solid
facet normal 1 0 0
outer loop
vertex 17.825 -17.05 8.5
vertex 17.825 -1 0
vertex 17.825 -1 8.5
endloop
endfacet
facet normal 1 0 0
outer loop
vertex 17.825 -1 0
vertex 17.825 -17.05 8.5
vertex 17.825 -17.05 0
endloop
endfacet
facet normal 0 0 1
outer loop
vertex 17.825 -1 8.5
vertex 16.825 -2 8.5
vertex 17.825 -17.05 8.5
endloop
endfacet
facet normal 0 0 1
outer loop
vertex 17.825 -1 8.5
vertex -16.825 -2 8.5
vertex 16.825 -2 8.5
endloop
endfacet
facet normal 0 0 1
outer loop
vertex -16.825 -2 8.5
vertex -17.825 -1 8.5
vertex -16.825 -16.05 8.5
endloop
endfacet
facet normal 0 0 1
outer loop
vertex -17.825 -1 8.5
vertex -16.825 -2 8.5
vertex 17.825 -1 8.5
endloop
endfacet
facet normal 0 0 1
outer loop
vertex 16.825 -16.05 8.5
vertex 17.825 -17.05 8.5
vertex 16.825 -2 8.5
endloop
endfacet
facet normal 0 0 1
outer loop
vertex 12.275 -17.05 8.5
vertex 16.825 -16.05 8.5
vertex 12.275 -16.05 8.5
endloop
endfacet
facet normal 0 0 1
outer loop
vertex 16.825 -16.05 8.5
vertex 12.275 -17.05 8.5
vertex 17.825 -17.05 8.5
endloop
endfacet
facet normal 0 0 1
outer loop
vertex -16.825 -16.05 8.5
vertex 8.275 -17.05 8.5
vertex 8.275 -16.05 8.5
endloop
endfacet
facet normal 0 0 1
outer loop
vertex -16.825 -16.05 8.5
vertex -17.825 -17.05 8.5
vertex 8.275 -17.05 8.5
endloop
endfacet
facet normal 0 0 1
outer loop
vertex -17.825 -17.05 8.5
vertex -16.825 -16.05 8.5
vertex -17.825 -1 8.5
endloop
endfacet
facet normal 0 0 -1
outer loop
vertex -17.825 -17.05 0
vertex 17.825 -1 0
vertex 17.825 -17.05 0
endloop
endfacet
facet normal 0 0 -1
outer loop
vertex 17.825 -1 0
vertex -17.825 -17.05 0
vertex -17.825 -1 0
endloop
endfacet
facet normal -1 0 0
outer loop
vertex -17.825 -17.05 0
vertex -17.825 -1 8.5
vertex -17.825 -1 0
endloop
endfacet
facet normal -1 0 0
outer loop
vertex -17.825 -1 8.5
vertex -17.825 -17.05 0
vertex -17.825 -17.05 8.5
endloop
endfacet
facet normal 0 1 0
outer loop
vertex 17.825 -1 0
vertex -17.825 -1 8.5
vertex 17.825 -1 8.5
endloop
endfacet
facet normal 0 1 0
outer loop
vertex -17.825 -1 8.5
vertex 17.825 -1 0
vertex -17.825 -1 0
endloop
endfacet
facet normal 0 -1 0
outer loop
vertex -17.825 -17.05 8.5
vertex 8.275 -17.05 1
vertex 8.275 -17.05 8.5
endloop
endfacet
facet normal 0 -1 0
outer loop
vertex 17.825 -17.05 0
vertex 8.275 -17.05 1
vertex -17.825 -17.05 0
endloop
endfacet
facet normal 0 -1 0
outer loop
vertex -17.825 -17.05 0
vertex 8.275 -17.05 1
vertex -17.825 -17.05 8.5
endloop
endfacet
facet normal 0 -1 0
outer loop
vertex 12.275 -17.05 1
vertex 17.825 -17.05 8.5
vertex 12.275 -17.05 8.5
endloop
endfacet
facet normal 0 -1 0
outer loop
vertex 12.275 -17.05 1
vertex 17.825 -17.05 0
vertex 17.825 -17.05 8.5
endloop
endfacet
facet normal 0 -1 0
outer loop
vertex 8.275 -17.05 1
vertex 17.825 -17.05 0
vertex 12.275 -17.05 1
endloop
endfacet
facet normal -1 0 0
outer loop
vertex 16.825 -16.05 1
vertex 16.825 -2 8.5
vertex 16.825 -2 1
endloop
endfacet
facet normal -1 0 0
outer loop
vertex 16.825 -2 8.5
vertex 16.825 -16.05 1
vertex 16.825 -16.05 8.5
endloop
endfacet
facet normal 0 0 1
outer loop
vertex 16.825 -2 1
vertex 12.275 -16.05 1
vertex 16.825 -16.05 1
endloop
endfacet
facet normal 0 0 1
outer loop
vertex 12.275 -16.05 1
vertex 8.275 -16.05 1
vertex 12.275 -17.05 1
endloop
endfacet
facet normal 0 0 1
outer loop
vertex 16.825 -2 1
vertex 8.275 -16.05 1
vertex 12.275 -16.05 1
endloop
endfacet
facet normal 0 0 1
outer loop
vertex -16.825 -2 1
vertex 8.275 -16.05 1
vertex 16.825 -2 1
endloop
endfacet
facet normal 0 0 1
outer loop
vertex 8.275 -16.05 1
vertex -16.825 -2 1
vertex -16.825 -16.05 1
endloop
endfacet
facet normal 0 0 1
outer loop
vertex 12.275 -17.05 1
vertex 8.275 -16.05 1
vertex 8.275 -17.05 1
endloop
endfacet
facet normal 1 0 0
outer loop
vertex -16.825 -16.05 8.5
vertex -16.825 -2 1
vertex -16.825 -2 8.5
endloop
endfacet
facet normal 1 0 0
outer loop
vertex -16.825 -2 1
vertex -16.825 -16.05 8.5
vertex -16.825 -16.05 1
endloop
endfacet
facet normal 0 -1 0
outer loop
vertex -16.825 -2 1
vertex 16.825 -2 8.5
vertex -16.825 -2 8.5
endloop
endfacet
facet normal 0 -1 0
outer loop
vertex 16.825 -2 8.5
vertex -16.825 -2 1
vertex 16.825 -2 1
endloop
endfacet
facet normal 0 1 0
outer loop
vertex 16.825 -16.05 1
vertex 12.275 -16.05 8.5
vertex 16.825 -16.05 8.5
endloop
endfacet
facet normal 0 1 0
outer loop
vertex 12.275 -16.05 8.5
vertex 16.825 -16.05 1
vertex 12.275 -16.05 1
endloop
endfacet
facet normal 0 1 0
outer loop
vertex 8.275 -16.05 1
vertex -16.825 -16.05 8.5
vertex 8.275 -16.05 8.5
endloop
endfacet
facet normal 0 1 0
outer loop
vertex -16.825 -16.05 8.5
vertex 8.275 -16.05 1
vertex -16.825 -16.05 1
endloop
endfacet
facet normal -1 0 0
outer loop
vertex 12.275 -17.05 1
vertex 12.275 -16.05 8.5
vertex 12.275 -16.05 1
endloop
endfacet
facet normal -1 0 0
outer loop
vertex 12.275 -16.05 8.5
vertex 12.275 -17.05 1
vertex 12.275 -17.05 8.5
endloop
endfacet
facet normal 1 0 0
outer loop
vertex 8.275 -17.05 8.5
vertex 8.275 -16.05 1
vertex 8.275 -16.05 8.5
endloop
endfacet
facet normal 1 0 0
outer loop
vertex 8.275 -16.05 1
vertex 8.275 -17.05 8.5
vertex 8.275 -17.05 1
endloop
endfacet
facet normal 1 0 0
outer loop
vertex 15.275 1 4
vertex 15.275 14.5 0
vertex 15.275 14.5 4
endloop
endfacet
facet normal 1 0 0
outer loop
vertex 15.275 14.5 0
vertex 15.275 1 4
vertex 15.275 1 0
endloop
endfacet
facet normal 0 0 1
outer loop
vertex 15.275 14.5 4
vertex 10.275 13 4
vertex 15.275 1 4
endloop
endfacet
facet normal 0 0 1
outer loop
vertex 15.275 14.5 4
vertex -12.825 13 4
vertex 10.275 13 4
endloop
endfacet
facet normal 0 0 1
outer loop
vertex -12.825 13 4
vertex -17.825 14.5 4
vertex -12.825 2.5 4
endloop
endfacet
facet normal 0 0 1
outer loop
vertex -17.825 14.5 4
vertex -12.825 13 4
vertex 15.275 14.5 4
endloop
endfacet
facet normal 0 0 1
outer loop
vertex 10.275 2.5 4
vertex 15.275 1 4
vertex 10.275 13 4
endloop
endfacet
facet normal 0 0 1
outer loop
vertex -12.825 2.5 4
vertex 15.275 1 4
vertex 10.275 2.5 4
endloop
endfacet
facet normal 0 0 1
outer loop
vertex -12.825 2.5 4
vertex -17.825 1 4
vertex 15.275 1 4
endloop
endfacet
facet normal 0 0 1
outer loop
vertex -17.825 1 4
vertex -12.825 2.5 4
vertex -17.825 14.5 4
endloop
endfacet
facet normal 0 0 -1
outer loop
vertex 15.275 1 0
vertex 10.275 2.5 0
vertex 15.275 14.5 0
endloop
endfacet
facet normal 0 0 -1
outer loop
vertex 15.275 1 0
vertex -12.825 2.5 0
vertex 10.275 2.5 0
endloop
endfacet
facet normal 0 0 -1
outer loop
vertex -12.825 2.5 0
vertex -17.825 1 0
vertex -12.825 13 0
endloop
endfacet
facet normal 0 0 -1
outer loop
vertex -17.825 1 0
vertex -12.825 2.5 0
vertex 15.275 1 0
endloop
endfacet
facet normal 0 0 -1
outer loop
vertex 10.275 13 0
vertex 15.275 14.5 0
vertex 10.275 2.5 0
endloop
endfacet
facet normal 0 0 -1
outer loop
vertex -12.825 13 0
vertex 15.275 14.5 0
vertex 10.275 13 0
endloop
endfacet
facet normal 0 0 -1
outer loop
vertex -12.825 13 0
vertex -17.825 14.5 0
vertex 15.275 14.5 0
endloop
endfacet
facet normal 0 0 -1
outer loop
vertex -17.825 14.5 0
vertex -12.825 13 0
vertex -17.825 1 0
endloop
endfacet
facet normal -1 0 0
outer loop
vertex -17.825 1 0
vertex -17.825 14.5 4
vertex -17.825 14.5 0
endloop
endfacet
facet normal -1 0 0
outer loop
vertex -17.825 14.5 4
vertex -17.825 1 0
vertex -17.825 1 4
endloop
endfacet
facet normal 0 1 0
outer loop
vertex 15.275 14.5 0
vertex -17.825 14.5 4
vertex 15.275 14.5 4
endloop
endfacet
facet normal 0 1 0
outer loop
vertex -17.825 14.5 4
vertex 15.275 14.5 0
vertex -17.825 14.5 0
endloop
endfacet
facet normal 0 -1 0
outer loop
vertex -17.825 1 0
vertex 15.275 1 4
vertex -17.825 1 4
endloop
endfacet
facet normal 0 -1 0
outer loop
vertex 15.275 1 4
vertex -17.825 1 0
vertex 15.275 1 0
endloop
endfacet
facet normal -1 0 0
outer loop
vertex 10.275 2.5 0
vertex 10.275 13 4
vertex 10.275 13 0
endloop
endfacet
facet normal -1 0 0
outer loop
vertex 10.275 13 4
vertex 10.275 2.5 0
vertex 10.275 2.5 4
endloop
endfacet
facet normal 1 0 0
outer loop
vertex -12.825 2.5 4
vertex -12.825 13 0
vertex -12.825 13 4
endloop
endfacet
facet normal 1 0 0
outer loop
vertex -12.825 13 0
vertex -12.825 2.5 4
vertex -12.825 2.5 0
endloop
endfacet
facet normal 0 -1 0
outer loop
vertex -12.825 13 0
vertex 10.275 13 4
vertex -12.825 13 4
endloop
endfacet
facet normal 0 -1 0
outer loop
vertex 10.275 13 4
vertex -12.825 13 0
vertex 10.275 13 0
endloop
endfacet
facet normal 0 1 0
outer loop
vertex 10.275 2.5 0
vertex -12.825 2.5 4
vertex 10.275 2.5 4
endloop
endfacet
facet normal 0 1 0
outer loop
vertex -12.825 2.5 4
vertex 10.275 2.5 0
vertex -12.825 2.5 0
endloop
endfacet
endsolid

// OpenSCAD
/**
 * Available displays:
 * 
 * Seed Technology:
 * + http://media.digikey.com/pdf/Data%20Sheets/Seeed%20Technology/114990163_Web.pdf
 */

/* [Settings] */

// Height of the border
height = 4;

// Wall thickness border top and bottom.
walls = 1.5;
// Wall thickness border left and right.
wallsSide = 5;
// Wall thickness lid.
wallsLid = 1;

// Tolerance for the display.
spacing = 0.25;
// Tolerance for the lid.
spacingLid = 0.025;

/* [Display measurements] */

// Display length
displayLength = 22.6;
// Display width.
displayWidth = 10;
// Display height without the board.
displayHeight = 6.3;

// Board length.
boardLength = 30;
// Board width.
boardWidth = 11;
// Board height including components on the back.
boardHeight = 2.5;

/* [Hidden] */

$fn = 50;

screwHoleDiameter = 2;

segmentLength = 7;
paddingSegment = 2.2;

//seedVoltMeter(displayColor, "green", holes);
//seedVoltMeter(displayColor, "yellow", holes);
//seedVoltMeter(displayColor, "red", holes);
//seedVoltMeter(displayColor, "blue", holes);
holder(height);

module holder(height) {
  heightLid = wallsLid + height + boardHeight + 1;

  outerLength = displayLength + (wallsSide + spacing ) * 2;
  outerWidth = displayWidth + (walls + spacing ) * 2;
  
  innerLength = displayLength + spacing * 2;
  innerWidth = displayWidth + spacing * 2;

  outerLengthTop = outerLength + (wallsLid + spacing + spacingLid ) * 2;
  outerWidthTop = outerWidth + (wallsLid + spacing + spacingLid) * 2;
  innerLengthTop = outerLengthTop - wallsLid * 2;
  innerWidthTop = outerWidthTop - wallsLid * 2;

  outletWidth = 4;
  xOffsetOutlet = outerLength + spacing + walls - outletWidth - 4.75;

  module bottom() {
    difference() {
      cube([outerLength, outerWidth, height]);

      translate([wallsSide, walls, -1])
        cube([innerLength, innerWidth, height + 2]);
    }
  }

  module top() {
    difference() {
      cube([outerLengthTop, outerWidthTop, heightLid]);

      translate([wallsLid, wallsLid, wallsLid])
        cube([innerLengthTop, innerWidthTop, heightLid  + 1]);

      translate([xOffsetOutlet, -1, wallsLid])
        cube([outletWidth, walls + 2, heightLid + 1]);
    }
  }

  translate([-outerLengthTop / 2, -outerWidthTop - 1, 0])
    top();

  translate([-outerLengthTop / 2, 1, 0])
    bottom();
}

module seedVoltMeter(displayColor="white", ledColor="green", holes=true) {
  screwHoleRadius = screwHoleDiameter /2 ;
  padding = (boardLength - displayLength) / 2;

  segmentWidth = (displayLength - paddingSegment * 4) / 3;

  segments = [
    [padding + 1.5, 1.5, boardHeight],
    [padding + segmentWidth + paddingSegment * 2, 1.5, boardHeight],
    [padding + (segmentWidth + paddingSegment) * 2 + paddingSegment, 1.5, boardHeight]
  ];

  translate([-boardLength / 2, -displayWidth / 2, 0]) {
    color("green") {
      difference() {
        cube([boardLength, boardWidth, boardHeight]);
        
        width = boardWidth / 3 + 1;
        length = (boardLength - displayLength) / 2 + 1;

        translate([-1, -1, -1])
          cube([length, width, boardHeight + 2]);

        translate([boardLength - length + 1, -1, -1])
          cube([length, width, boardHeight + 2]);
        
        translate([boardLength - length + 1, boardWidth -width + 1, -1])
          cube([length, width, boardHeight + 2]);
        
        translate([-1, boardWidth -width + 1, -1])
          cube([length, width, boardHeight + 2]);
        
        translate([length / 2 - 0.5, boardWidth / 2, -1])
          cylinder(r=screwHoleRadius, h = boardHeight + 2);
        translate([boardLength -length / 2 + 0.5, boardWidth / 2, -1])
          cylinder(r=screwHoleRadius, h = boardHeight + 2);
      }
    }
    color(displayColor)
      group() {
        difference() {
          translate([padding, 0, boardHeight])
            cube([displayLength, displayWidth, displayHeight]);

          if(holes)
            for(pos=segments)
              translate(pos)
                segment(displayHeight + 1);
        }
      }

      if(holes)
        for(pos=segments)
          translate(pos)
            color(ledColor)
              segment(displayHeight);
  }

  module segment(height, color="white") {
    length = segmentWidth - 2;
    width = 0.5;
    horizontal = [
      [1, 0, 0],
      [1, (segmentLength - width) / 2, 0],
      [1, segmentLength - width, 0]
    ];

    vertical = [
      [0, width, 0],
      [segmentWidth - width, width, 0],
      [0, width + (segmentLength - width * 3) / 2 +width, 0],
      [segmentWidth - width, width + (segmentLength - width * 3) / 2 +width, 0]
    ];

    group() {
      for(pos=horizontal)
        translate(pos)
          cube([length, width, height]);

      for(pos=vertical)
        translate(pos)
          cube([width, (segmentLength - width * 3) / 2, height]);

      translate([segmentWidth + width * 1.5, 0, 0])
        cube([width, width, height]);
    }
  }
}
